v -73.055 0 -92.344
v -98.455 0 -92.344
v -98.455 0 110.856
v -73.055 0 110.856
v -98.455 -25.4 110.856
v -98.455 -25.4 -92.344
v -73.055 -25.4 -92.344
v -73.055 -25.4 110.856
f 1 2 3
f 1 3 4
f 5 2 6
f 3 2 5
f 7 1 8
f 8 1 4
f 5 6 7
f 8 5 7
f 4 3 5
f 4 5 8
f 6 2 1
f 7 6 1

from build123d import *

# Parameters (mm, degrees)
F1_DEPTH = 25.4
F3_W     = 25.4
F3_H     = 203.2
F4_DEPTH = 25.4


with BuildPart() as f1:
    # F0 (on Right) → F1 (new body)
    with BuildSketch(Plane.YZ):
        Polygon((93.4831788659, 86.7940613191), (-58.9168211341, 86.7940613191), (-58.9168211341, -65.6059386809), (93.4831788659, -65.6059386809), (93.4831788659, 22.3822435506), align=None)
    extrude(amount=F1_DEPTH)


with BuildPart() as f4:
    # F3 (on Front) → F4 (new body)
    with BuildSketch(Plane.XZ):
        with Locations((-85.7546515763, 9.2563959739)):
            Rectangle(F3_W, F3_H)
    extrude(amount=F4_DEPTH)


solid = f4.part
